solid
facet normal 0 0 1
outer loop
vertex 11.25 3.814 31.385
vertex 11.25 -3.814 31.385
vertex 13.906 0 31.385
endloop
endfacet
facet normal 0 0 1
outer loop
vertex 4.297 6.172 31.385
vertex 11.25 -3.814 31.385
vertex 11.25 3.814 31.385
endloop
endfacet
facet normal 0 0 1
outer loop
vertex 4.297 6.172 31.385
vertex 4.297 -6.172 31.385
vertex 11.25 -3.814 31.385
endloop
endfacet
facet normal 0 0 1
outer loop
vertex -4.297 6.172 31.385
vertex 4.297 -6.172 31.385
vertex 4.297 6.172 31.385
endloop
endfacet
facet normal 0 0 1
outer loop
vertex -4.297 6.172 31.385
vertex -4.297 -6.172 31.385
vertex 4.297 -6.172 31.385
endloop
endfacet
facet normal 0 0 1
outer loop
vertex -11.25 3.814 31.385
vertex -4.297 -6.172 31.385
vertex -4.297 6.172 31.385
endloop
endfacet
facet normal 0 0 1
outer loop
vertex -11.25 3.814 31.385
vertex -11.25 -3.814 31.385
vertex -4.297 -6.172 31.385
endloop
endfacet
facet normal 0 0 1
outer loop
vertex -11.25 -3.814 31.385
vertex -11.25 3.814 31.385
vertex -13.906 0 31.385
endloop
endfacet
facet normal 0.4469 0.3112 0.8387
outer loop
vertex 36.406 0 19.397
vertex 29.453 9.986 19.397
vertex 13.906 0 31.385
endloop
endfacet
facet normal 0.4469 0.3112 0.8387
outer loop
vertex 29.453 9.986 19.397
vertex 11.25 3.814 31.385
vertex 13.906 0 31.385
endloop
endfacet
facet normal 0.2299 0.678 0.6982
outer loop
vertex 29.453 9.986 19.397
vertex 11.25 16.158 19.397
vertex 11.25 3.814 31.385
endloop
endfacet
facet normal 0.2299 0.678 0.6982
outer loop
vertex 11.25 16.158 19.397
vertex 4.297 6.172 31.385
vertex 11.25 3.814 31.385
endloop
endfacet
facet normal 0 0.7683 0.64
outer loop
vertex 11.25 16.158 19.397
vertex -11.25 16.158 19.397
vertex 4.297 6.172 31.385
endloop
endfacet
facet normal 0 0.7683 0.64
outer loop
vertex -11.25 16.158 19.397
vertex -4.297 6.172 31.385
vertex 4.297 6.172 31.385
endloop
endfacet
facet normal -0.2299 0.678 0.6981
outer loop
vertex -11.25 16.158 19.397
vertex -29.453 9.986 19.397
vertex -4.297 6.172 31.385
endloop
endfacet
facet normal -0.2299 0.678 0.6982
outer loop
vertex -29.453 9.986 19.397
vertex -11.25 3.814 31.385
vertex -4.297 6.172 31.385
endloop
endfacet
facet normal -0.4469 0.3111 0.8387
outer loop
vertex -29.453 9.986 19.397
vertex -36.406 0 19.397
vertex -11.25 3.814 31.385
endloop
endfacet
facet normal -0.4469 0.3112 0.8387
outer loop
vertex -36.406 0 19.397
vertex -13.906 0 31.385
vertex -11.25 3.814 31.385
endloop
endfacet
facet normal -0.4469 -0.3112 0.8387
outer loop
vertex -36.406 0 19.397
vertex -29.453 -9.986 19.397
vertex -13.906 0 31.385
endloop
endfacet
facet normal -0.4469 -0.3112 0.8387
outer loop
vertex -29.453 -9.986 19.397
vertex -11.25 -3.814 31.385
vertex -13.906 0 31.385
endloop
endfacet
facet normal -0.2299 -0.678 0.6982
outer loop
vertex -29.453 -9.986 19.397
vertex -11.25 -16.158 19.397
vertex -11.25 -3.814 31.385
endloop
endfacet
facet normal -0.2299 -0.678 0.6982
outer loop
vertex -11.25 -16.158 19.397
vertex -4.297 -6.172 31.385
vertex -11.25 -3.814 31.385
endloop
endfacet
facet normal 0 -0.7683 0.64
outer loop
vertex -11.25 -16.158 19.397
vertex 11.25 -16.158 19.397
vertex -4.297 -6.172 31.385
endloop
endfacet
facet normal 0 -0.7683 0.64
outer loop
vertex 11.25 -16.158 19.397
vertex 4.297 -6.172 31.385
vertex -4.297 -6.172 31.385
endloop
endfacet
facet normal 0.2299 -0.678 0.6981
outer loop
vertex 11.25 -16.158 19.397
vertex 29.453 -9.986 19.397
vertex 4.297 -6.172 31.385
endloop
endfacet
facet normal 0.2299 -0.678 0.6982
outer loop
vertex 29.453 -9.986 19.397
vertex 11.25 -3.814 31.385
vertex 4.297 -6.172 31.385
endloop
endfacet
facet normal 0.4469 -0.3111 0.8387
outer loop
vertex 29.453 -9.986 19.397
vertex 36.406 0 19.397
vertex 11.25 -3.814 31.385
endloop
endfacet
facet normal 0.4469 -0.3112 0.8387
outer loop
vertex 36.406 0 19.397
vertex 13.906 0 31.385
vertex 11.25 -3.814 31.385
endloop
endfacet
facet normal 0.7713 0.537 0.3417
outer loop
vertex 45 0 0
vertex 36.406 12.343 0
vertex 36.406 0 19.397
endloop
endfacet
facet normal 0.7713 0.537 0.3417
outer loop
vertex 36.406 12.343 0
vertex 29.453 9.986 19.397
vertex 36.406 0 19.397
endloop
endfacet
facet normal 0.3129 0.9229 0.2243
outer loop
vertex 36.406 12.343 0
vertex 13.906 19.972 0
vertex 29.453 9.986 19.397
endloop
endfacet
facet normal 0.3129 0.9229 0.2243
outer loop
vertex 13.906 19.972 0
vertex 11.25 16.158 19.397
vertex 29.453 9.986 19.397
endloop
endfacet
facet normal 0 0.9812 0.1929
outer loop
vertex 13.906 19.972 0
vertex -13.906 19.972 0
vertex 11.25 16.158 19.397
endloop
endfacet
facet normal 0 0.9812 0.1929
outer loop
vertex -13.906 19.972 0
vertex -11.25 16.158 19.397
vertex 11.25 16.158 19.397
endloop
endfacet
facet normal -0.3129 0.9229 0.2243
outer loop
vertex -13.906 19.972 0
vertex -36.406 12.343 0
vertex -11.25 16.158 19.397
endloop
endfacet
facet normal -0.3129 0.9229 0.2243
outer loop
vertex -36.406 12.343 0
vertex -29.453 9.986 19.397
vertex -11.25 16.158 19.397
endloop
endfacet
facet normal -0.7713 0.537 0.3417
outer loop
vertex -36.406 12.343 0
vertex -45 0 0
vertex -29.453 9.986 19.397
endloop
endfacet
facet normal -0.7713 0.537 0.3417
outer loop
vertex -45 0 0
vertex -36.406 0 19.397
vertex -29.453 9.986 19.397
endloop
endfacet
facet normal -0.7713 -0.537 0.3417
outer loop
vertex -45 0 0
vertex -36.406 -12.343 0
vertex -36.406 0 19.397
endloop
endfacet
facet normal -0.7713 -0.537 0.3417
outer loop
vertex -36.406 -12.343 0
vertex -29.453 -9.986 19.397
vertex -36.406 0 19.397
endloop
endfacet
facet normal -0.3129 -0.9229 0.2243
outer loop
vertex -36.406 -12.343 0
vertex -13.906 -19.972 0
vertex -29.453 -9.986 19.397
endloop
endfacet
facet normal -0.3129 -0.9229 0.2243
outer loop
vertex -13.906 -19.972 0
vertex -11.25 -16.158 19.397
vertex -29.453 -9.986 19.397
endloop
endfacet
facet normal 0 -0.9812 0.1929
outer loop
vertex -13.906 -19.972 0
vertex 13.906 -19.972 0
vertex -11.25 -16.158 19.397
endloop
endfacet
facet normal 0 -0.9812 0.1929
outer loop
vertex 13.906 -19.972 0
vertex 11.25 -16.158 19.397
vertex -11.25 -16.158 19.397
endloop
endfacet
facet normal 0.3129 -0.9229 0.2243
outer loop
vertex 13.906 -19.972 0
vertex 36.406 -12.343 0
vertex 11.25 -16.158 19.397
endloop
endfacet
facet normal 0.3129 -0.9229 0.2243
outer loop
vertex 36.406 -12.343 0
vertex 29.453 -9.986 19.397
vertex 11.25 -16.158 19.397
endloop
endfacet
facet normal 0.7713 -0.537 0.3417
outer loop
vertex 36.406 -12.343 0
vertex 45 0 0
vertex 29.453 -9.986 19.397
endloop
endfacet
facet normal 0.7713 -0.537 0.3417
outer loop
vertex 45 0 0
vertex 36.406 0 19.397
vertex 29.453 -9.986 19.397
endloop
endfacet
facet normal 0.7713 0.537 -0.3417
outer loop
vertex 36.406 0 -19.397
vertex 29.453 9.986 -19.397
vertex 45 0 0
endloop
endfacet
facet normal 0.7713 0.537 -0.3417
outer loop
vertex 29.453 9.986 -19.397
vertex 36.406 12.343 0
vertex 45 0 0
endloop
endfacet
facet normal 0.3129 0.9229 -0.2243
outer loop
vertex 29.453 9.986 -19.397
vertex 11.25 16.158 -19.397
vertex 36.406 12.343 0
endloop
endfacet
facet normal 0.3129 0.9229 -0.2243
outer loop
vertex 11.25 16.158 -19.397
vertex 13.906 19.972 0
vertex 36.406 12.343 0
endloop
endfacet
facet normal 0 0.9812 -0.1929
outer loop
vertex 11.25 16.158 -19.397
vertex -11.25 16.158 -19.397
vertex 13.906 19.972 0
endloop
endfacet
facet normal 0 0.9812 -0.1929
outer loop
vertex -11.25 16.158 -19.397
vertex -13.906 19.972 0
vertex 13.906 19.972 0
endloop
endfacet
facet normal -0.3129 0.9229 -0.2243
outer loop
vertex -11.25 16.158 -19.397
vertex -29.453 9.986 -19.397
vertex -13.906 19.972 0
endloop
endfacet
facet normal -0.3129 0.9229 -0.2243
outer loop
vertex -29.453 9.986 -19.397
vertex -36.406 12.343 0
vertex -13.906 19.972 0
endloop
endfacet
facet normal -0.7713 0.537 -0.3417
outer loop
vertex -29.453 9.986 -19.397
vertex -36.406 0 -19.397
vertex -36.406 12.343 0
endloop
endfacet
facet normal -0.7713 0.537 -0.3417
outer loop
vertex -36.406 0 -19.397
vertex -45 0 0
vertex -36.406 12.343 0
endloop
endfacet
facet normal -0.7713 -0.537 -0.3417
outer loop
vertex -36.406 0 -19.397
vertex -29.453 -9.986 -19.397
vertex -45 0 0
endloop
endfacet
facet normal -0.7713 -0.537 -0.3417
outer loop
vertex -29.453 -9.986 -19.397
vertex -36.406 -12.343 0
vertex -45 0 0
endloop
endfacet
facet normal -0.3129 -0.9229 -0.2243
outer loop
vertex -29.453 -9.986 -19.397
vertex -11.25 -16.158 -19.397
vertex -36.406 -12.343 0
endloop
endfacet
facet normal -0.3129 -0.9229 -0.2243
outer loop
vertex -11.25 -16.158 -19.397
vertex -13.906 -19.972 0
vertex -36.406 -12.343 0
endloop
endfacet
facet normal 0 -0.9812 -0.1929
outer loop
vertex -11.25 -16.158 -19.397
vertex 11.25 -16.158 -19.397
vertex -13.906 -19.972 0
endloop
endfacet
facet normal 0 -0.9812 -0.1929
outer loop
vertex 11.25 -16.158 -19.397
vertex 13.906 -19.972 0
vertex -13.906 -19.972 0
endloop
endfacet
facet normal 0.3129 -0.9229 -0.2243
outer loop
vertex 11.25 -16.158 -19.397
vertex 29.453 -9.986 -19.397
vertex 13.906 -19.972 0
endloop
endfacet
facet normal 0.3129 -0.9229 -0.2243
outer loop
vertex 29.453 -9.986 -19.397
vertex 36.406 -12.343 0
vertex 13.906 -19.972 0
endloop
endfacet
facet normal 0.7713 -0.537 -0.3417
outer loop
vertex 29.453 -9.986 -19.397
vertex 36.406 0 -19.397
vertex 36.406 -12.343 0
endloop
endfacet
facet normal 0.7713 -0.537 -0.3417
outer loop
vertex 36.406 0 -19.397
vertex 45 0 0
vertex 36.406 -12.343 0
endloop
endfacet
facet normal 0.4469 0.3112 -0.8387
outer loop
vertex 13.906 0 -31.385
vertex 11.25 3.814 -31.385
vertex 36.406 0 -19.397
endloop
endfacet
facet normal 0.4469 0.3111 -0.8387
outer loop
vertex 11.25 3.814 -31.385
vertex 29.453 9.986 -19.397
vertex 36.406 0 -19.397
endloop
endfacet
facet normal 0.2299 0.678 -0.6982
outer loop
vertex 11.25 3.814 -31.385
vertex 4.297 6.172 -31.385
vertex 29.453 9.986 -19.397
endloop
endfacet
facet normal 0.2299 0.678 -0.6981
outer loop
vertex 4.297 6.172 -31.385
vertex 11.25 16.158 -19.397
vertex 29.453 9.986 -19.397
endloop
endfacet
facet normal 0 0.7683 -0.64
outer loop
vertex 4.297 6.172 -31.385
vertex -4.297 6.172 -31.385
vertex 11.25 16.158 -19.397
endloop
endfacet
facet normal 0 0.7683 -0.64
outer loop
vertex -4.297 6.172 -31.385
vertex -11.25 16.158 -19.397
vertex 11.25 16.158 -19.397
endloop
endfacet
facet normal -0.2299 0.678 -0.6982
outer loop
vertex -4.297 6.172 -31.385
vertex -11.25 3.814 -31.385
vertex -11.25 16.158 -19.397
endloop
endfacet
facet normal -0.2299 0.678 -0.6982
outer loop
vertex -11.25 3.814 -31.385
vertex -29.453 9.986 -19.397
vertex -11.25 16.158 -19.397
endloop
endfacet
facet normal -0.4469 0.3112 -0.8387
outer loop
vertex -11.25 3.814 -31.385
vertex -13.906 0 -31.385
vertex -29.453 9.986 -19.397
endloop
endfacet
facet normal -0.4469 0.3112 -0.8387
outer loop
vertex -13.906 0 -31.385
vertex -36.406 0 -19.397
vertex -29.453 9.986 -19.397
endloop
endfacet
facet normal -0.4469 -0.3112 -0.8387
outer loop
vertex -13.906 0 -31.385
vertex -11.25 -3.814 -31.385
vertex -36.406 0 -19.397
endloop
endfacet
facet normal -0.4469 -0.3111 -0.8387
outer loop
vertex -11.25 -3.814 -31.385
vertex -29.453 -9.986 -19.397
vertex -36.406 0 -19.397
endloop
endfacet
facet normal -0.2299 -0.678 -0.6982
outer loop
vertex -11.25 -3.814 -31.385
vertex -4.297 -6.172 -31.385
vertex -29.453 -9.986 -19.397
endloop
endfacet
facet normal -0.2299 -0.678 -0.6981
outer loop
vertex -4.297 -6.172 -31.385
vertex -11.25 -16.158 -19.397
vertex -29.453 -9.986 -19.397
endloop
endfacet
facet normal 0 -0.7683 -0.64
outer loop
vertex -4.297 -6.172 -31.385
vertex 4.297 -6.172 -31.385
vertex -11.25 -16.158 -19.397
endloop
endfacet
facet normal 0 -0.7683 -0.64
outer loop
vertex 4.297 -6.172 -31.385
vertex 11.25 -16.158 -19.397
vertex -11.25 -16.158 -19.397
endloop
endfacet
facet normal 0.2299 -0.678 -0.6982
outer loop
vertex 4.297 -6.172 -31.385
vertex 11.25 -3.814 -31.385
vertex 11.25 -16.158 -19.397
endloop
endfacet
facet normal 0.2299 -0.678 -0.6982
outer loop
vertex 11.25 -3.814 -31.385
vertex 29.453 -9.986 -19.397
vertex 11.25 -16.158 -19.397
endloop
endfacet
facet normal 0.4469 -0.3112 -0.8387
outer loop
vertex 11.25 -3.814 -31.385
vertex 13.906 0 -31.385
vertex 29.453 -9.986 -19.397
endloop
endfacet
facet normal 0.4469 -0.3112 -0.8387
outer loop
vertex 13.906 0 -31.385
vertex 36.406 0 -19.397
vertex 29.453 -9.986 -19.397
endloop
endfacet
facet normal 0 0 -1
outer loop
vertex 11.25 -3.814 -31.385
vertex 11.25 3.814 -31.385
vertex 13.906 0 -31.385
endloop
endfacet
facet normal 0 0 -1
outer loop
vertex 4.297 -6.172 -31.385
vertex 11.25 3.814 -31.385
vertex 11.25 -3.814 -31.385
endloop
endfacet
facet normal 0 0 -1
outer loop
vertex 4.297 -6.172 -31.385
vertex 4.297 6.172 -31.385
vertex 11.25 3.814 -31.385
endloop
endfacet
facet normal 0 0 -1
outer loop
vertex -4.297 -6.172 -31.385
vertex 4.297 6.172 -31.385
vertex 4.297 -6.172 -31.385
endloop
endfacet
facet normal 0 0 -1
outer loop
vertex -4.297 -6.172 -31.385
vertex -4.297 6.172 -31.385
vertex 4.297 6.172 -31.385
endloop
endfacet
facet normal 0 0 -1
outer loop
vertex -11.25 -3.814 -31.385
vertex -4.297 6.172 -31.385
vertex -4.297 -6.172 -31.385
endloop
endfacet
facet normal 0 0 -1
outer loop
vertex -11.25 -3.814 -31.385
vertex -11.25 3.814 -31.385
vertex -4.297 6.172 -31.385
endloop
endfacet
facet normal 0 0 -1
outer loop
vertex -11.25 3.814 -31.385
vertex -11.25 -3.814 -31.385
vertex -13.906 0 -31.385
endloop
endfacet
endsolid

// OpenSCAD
// Generated by SolidPython 1.0.1 on 2020-07-29 00:46:51


scale(v = [15, 7, 11]) {
	sphere(r = 3);
}
/***********************************************
*********      SolidPython code:      **********
************************************************
 
# import packages: SolidPython
from solid import *
from solid.utils import *
from itertools import chain, combinations, permutations


class Resize:

    def __init__(self, scad_file):
        self.scad_file = scad_file
        #self.scad_file = import_scad(scad_file)
        # cone/cylinder param:
        self.r1 = 0
        self.r2 = 0
        self.h = 0
        # rectangular prism param:
        self.w = 0
        self.l = 0
        # ellipse param:
        self.r = 0

    # import OpenScad code (file name corresponds to shape)


    # classify shape + parameters
    def assign(self, param1, param2, param3):
        if self.scad_file == 'cone.scad':
            self.r1 = param1
            self.r2 = param2
            self.h = param3
        elif self.scad_file == 'cylinder.scad':
            self.r1 = param1
            self.r2 = param2
            self.h = param3
        elif self.scad_file == 'rectangularPrism.scad':
            self.h = param1
            self.l = param2
            self.w = param3
        else:
            self.r = param1
            self.h = param2

    # resize parameters
    def iterate(self):
        x = range(3, 20, 2)
        i = 1
        if self.scad_file == 'cone.scad':
            tempList = list(permutations(x, 2))
            for temp in tempList:
                param1 = temp[0]
                param2 = temp[1]
                filepath = 'produced_scad_files/' + 'cone' + str(param1) + '_' + str(param2) + '_' + '.scad'
                scad_render_to_file(cylinder(h=param1, r1=param2, r2=0), filepath)

        elif self.scad_file == 'cylinder.scad':
            tempList = list(permutations(x, 3))
            for temp in tempList:
                param1 = temp[0]
                param2 = temp[1]
                filepath = 'produced_scad_files/' + 'cylinder' + str(param1) + '_' + str(param2) + '_' + '.scad'
                scad_render_to_file(cylinder(h=param1, r1=param2, r2=param2), filepath)

        elif self.scad_file == 'rectangularPrism.scad':
            tempList = list(permutations(x, 3))
            for temp in tempList:
                param1 = temp[0]
                param2 = temp[1]
                param3 = temp[2]
                filepath = 'produced_scad_files/' + 'rectangularPrism' + str(param1) + '_' + str(param2) + '_' + str(
                    param3) + '.scad'
                scad_render_to_file(cube(size=(param1, param2, param3)), filepath)

        elif self.scad_file == 'ellipse.scad':
            tempList = list(permutations(x, 4))
            for temp in tempList:
                param1 = temp[0]
                param2 = temp[1]
                param3 = temp[2]
                param4 = temp[3]
                filepath = 'produced_scad_files/' + 'ellipse' + str(param1) + '_' + str(param2) + '_' + str(param3) + '_' + str(param4) + '.scad'
                scad_render_to_file(scale([param1, param2, param3])(sphere(r=param4)), filepath)

    def render_to_scadfile(self):
        scad_render_to_file(scad, 'example.scad') 
 
************************************************/
